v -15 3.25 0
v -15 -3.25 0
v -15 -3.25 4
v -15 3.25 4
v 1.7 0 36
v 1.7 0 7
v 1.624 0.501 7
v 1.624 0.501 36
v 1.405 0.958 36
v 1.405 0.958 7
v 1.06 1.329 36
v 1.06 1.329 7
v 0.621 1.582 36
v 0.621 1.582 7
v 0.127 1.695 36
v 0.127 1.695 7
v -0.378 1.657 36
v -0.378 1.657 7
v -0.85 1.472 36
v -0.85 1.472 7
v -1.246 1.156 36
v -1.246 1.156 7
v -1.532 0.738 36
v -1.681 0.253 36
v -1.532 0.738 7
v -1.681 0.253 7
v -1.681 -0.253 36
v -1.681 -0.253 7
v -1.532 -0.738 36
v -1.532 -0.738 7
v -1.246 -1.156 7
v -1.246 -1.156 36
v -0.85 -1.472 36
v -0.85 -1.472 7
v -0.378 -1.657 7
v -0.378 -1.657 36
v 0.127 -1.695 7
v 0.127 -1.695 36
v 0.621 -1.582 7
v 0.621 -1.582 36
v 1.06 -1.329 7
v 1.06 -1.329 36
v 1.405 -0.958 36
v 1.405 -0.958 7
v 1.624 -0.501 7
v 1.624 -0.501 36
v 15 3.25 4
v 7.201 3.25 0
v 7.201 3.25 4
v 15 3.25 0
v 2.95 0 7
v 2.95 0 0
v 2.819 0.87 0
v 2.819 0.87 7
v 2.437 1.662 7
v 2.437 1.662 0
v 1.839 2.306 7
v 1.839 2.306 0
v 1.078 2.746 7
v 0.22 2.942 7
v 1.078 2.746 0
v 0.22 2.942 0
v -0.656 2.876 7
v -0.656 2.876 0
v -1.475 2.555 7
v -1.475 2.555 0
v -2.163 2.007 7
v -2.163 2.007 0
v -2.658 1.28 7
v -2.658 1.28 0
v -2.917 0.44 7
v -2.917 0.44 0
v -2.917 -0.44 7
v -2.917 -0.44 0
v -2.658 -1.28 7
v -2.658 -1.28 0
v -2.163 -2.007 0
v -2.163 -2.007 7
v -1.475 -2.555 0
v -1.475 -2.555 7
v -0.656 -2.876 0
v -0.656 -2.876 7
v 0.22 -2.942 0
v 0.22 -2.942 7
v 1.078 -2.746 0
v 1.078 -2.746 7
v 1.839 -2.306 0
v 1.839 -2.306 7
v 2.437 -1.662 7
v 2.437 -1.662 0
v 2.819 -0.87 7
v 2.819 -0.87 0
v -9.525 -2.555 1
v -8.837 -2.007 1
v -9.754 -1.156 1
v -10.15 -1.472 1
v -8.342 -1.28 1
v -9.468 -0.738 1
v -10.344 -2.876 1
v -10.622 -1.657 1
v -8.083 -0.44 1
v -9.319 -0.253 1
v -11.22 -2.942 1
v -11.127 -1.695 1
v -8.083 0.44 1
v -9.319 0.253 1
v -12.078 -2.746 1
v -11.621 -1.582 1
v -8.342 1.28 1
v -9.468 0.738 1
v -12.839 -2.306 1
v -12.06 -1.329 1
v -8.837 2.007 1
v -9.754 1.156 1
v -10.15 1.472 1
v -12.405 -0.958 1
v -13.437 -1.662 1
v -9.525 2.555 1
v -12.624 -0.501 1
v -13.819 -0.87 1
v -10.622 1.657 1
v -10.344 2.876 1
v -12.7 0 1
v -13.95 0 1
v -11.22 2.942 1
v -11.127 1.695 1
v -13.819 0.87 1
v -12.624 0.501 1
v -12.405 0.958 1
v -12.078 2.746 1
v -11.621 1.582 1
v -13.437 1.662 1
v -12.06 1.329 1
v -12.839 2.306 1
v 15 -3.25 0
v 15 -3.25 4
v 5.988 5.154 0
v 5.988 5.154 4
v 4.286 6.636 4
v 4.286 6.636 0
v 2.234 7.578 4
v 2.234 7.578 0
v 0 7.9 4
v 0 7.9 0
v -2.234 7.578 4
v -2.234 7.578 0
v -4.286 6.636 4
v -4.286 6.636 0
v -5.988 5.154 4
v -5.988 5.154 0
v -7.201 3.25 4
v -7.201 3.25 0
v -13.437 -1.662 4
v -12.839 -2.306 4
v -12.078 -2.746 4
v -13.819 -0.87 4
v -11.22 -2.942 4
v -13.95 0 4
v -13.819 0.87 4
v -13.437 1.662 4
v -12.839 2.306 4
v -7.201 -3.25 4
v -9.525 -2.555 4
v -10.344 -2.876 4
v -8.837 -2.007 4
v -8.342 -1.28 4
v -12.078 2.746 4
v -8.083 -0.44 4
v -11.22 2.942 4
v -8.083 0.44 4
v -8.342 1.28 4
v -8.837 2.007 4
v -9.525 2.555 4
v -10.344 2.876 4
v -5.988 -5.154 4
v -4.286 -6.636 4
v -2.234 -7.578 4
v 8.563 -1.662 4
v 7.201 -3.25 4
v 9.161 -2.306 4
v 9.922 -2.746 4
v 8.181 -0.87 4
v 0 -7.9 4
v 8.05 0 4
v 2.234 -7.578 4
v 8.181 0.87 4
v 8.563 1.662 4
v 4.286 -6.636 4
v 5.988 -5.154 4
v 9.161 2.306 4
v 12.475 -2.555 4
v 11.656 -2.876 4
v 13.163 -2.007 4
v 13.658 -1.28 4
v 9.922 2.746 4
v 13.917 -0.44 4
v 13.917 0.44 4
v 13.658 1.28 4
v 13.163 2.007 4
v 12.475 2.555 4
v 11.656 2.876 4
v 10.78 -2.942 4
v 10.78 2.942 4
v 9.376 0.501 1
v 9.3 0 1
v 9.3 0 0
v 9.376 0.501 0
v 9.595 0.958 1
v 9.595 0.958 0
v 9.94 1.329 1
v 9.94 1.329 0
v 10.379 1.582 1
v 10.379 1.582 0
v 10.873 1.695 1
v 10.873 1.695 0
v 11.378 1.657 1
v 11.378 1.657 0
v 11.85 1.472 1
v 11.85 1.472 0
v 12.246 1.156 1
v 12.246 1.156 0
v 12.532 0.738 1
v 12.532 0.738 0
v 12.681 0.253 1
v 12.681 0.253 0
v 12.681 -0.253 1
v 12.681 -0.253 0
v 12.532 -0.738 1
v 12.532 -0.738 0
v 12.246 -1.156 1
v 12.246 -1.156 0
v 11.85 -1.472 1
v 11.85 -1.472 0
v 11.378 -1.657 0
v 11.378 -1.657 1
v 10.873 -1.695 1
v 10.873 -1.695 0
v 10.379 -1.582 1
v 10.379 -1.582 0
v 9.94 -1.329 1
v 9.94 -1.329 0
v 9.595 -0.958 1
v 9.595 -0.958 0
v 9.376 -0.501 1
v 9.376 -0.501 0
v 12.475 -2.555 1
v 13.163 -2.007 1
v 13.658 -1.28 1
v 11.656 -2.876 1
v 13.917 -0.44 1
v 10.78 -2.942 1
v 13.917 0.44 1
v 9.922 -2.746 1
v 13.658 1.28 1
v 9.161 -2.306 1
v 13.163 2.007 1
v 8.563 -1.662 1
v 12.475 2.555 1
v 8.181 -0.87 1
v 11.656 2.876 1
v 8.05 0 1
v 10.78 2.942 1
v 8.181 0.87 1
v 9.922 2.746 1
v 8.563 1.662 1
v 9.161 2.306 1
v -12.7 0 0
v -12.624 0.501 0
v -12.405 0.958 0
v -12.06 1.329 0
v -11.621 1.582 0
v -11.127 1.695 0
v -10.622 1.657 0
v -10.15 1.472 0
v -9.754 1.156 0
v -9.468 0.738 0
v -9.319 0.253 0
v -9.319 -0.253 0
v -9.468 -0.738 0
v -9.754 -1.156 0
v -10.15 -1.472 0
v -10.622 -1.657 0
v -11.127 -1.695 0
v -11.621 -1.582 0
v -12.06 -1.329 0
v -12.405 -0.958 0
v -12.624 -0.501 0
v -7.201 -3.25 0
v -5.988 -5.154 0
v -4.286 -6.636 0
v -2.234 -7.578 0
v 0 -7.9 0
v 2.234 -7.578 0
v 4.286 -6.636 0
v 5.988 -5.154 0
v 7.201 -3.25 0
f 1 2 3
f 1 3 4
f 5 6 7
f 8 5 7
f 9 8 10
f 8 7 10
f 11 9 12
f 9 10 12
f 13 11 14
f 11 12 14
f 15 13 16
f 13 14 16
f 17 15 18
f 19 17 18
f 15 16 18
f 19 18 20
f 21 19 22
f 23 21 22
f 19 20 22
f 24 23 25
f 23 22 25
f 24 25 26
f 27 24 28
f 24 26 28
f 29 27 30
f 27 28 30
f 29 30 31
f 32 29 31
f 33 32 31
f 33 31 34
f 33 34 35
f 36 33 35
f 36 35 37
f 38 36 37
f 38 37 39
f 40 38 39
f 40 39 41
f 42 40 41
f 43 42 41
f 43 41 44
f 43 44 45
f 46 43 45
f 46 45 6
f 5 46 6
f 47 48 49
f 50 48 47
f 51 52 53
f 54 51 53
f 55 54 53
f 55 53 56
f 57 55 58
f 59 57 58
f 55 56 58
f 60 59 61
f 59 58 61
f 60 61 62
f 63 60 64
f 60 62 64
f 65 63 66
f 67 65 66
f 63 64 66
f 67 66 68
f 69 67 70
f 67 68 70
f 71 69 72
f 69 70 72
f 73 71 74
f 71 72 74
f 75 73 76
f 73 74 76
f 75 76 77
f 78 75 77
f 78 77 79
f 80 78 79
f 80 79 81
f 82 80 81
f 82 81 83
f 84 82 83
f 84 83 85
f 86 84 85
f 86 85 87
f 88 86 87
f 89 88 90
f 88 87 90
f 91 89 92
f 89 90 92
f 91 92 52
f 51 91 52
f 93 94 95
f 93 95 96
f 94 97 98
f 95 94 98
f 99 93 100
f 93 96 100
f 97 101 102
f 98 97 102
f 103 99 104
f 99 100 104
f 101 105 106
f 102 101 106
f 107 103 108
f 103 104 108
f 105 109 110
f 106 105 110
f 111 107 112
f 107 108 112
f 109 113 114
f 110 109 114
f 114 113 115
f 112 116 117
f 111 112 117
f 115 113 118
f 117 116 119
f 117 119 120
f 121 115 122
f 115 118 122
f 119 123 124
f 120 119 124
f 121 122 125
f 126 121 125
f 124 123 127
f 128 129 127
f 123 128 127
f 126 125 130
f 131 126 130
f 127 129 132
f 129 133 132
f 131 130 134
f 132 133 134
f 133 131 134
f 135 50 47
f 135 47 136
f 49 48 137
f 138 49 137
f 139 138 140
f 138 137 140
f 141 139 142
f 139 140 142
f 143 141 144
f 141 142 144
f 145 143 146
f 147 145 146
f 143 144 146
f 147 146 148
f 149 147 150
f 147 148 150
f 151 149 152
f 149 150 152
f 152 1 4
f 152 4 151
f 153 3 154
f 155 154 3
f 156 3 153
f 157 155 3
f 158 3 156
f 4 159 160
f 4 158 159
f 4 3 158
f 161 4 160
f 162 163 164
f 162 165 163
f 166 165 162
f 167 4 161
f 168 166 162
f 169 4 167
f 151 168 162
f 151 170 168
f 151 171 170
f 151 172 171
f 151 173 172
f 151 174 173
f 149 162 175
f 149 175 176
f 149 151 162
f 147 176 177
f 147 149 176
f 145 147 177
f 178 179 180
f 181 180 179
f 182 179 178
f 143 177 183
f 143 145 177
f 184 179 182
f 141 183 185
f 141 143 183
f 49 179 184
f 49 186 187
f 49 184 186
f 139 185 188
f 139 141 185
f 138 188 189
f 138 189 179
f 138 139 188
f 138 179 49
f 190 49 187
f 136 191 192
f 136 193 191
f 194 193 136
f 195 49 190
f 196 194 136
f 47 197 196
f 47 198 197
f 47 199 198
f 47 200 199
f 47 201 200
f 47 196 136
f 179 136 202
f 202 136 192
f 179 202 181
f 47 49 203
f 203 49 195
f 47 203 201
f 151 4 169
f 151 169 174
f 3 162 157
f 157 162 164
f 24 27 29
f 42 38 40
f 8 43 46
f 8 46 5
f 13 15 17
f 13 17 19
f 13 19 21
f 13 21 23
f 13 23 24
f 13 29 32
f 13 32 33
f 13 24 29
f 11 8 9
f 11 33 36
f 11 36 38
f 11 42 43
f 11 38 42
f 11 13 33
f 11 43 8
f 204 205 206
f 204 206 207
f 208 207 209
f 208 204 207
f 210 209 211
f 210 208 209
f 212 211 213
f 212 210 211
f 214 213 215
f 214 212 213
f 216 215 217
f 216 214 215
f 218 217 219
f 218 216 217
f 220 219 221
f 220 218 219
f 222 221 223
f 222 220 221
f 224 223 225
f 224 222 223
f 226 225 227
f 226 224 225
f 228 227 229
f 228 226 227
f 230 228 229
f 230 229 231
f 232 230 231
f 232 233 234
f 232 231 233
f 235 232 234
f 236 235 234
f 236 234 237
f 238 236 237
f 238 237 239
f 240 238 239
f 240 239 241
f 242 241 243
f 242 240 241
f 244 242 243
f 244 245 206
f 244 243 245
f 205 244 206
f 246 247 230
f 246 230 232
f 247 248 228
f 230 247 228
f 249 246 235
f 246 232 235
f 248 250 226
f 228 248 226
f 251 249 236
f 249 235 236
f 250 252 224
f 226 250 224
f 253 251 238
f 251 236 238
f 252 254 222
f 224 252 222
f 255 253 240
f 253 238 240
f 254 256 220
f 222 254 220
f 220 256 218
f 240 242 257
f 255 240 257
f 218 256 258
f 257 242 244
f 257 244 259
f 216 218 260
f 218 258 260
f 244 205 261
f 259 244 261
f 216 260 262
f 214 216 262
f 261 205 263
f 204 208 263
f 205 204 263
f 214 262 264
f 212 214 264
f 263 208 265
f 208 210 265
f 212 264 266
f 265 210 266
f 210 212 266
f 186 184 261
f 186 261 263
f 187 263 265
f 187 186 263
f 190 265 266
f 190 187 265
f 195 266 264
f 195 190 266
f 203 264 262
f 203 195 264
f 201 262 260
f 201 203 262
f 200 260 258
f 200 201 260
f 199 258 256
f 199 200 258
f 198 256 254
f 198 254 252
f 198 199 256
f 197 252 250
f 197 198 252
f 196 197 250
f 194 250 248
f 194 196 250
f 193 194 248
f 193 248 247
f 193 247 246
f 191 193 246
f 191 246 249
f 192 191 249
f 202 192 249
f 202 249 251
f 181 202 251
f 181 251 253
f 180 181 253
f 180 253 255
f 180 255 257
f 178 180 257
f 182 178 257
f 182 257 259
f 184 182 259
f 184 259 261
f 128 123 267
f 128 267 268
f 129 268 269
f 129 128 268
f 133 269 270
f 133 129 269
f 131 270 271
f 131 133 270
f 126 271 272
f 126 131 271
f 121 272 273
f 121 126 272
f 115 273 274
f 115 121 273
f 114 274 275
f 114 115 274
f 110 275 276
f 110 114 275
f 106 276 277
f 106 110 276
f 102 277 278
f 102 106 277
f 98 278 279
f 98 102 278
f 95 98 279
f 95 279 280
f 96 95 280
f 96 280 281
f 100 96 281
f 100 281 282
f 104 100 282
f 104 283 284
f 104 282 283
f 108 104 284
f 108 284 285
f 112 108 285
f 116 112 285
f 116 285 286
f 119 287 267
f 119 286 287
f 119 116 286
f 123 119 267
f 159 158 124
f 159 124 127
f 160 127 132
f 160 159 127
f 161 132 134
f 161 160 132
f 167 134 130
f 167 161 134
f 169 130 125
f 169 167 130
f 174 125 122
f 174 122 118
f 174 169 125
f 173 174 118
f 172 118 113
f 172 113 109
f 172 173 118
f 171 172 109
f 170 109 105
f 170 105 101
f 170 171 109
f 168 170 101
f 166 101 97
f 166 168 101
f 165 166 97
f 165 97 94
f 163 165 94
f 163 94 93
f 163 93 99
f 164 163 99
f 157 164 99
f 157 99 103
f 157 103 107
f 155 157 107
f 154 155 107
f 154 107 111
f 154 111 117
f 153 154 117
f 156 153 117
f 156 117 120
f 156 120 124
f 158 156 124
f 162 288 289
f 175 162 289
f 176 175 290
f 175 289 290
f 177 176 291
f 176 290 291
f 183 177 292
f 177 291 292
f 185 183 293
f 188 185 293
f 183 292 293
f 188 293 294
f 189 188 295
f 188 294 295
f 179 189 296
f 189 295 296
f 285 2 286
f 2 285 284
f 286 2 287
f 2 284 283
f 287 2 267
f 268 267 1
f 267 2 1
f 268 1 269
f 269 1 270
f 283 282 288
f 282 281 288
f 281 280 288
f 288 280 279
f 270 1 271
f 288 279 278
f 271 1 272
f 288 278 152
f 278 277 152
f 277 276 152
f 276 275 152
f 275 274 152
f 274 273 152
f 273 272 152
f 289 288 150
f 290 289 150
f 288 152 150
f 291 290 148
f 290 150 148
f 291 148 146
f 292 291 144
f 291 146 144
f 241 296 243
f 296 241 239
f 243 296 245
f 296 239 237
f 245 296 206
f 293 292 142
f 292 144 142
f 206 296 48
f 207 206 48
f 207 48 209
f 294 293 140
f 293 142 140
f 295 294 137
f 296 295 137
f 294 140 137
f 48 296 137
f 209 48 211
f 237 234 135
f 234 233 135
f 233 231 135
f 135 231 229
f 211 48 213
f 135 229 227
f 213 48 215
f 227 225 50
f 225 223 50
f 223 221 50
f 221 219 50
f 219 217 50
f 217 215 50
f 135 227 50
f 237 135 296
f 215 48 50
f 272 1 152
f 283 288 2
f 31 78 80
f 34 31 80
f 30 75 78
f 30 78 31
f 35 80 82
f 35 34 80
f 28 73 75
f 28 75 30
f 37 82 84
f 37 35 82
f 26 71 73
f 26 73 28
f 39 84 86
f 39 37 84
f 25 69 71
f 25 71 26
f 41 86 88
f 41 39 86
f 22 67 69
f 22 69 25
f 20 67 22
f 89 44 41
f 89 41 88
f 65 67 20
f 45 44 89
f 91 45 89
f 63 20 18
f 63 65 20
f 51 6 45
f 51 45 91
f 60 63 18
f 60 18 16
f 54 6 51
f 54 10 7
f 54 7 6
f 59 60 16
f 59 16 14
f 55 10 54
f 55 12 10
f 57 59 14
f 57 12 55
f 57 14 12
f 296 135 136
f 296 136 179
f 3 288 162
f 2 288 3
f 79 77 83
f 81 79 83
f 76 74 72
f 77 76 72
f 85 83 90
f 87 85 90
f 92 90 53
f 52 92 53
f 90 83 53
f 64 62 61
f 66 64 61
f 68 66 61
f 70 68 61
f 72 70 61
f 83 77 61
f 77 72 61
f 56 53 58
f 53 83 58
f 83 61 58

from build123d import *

# Parameters (mm, degrees)
CYLINDER_R               = 2.95
CYLINDER_DEPTH           = 7
CYLINDER001_R            = 1.7
CYLINDER001_DEPTH        = 30
CLONE060_PLACEMENT_ANGLE = 180
CLONE059_PLACEMENT_ANGLE = 180
PAD010_DEPTH             = 4


with BuildPart() as m3bolthead:
    # Cylinder → Cylinder (new body)
    with BuildSketch(Plane.XY):
        Circle(CYLINDER_R)
    extrude(amount=CYLINDER_DEPTH)


with BuildPart() as m3bolt:
    # Cylinder001 → Cylinder001 (new body)
    with BuildSketch(Plane.XY.offset(6)):
        Circle(CYLINDER001_R)
    extrude(amount=CYLINDER001_DEPTH)

    # Fusion: union M3BoltHead
    add(m3bolthead.part)


with BuildPart() as clone_of_m3bolt020:
    # Clone060 base: copy of M3Bolt
    add(m3bolt.part)


with BuildPart() as clone_of_m3bolt020_1:
    # Clone060 placement: moved
    add(clone_of_m3bolt020.part.moved(Location((-11, 0, 8))).rotate(Axis((-11, 0, 8), (0, 1, 0)), CLONE060_PLACEMENT_ANGLE))


with BuildPart() as fusion020:
    # Clone059 base: copy of M3Bolt
    add(m3bolt.part)


with BuildPart() as fusion020_1:
    # Clone059 placement: moved
    add(fusion020.part.moved(Location((11, 0, 8))).rotate(Axis((11, 0, 8), (0, 1, 0)), CLONE059_PLACEMENT_ANGLE))

    # Fusion020: union Clone of M3Bolt020
    add(clone_of_m3bolt020_1.part)


with BuildPart() as f_622zzbearingfix:
    # Sketch017 → Pad010 (new body)
    with BuildSketch(Plane.XY):
        with BuildLine():
            ThreePointArc((-7.200521, -3.25), (0, -7.9), (7.200521, -3.25))
            Line((15, -3.25), (7.200521, -3.25))
            Line((15, 3.25), (15, -3.25))
            Line((7.200521, 3.25), (15, 3.25))
            ThreePointArc((7.200521, 3.25), (0, 7.9), (-7.200521, 3.25))
            Line((-15, 3.25), (-7.200521, 3.25))
            Line((-15, -3.25), (-15, 3.25))
            Line((-7.200521, -3.25), (-15, -3.25))
        make_face()
    extrude(amount=PAD010_DEPTH)

    # Cut021: cut Fusion020
    add(fusion020_1.part, mode=Mode.SUBTRACT)


solid = Compound([m3bolt.part, f_622zzbearingfix.part])
